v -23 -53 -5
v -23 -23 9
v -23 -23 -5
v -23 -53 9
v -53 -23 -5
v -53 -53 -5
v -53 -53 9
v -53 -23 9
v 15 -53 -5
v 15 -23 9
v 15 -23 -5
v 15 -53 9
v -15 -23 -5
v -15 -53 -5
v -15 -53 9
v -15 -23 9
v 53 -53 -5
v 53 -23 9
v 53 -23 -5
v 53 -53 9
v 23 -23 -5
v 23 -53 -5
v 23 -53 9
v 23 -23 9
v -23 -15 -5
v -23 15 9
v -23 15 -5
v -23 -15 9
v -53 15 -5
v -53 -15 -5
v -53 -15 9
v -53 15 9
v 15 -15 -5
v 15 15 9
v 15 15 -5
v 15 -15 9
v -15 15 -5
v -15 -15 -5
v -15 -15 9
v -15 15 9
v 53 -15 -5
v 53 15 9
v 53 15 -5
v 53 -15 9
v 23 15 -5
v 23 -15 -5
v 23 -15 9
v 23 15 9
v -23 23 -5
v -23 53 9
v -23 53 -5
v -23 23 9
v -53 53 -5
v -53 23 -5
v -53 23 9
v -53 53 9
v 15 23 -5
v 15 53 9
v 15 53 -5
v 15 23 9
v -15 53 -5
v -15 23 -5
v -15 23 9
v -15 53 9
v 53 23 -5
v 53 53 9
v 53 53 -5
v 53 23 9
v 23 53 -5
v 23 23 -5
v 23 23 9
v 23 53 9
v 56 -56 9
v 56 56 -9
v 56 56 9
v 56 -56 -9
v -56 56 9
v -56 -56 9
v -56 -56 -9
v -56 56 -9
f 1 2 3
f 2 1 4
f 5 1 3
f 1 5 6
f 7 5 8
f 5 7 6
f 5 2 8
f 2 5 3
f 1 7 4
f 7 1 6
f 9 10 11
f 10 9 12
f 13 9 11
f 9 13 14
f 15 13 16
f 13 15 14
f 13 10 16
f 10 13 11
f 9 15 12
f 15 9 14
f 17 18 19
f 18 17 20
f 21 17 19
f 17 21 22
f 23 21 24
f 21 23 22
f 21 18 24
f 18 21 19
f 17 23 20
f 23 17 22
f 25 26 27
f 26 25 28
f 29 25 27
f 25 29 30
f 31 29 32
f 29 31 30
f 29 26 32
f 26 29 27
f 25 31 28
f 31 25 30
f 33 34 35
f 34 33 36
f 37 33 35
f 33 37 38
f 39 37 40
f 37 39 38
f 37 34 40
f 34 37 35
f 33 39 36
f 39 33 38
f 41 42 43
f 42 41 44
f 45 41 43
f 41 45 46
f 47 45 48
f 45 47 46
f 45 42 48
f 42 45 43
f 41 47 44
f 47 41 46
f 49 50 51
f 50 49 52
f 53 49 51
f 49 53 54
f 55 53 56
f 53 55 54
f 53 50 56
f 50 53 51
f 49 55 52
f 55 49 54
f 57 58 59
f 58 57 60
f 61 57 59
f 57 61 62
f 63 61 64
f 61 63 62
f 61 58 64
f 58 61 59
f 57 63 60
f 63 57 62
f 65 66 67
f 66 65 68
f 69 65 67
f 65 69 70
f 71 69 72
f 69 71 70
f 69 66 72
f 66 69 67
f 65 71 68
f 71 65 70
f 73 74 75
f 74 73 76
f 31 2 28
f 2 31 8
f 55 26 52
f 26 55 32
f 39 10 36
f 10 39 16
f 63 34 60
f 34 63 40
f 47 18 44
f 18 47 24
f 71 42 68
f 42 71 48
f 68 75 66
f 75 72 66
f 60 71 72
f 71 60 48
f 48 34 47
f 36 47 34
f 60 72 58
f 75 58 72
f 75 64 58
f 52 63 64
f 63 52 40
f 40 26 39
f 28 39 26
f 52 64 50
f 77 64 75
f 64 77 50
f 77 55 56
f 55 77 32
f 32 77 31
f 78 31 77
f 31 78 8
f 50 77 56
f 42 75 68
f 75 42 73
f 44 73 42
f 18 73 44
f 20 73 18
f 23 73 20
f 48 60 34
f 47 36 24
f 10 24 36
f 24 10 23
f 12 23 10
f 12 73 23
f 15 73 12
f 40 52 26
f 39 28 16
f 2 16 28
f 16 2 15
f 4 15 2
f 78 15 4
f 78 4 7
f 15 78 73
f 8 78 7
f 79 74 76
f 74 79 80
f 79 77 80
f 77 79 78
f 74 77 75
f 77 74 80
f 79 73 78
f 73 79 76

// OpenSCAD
$fn = 32;

// ----------------------------------------------------------------------
// Pocket plate 112 x 112 x 18
// 3 x 3 pockets 30 mm square, 14 mm deep
// ----------------------------------------------------------------------

// --- parameters (mm) ---
thickness = 18;  // plate thickness
seat_tol = 0.1;  // tolerance at the seating features
free_tol = 0.5;  // general tolerance on the free sizes
floor_t = 4;     // material left under each pocket
pocket = 30;     // pocket side length
pitch_x = 38;    // pocket pitch along X
pitch_y = 38;    // pocket pitch along Y
cols = 3;        // pockets per row
rows = 3;        // rows of pockets

// --- derived feature positions (mm) ---
depth = thickness - floor_t;        // = 14   pocket depth, down to the floor
span_x = (cols - 1) * pitch_x;      // = 76   distance between outer pockets
span_y = (rows - 1) * pitch_y;      // = 76   distance between outer pocket rows
origin_x = -span_x / 2;             // = -38   X of the first pocket
origin_y = -span_y / 2;             // = -38   Y of the first pocket
plate = [span_x + pocket + 6, span_y + pocket + 6, thickness];  // = [112, 112, 18]   overall size: pockets plus 3 mm of wall on each side
feature_centers = [
  [origin_x + 0 * pitch_x, origin_y + 0 * pitch_y],
  [origin_x + 1 * pitch_x, origin_y + 0 * pitch_y],
  [origin_x + 2 * pitch_x, origin_y + 0 * pitch_y],
  [origin_x + 0 * pitch_x, origin_y + 1 * pitch_y],
  [origin_x + 1 * pitch_x, origin_y + 1 * pitch_y],
  [origin_x + 2 * pitch_x, origin_y + 1 * pitch_y],
  [origin_x + 0 * pitch_x, origin_y + 2 * pitch_y],
  [origin_x + 1 * pitch_x, origin_y + 2 * pitch_y],
  [origin_x + 2 * pitch_x, origin_y + 2 * pitch_y]
];   // pocket centres, used verbatim by the cutter loop

// plate outline, then one pocket per centre in feature_centers
difference() {
  cube(plate, center = true);
  for (centre = feature_centers)
    translate([centre[0] - pocket / 2, centre[1] - pocket / 2, plate[2] / 2 - depth])
      cube([pocket, pocket, depth + 1]);  // centred on the declared pocket centre
}
